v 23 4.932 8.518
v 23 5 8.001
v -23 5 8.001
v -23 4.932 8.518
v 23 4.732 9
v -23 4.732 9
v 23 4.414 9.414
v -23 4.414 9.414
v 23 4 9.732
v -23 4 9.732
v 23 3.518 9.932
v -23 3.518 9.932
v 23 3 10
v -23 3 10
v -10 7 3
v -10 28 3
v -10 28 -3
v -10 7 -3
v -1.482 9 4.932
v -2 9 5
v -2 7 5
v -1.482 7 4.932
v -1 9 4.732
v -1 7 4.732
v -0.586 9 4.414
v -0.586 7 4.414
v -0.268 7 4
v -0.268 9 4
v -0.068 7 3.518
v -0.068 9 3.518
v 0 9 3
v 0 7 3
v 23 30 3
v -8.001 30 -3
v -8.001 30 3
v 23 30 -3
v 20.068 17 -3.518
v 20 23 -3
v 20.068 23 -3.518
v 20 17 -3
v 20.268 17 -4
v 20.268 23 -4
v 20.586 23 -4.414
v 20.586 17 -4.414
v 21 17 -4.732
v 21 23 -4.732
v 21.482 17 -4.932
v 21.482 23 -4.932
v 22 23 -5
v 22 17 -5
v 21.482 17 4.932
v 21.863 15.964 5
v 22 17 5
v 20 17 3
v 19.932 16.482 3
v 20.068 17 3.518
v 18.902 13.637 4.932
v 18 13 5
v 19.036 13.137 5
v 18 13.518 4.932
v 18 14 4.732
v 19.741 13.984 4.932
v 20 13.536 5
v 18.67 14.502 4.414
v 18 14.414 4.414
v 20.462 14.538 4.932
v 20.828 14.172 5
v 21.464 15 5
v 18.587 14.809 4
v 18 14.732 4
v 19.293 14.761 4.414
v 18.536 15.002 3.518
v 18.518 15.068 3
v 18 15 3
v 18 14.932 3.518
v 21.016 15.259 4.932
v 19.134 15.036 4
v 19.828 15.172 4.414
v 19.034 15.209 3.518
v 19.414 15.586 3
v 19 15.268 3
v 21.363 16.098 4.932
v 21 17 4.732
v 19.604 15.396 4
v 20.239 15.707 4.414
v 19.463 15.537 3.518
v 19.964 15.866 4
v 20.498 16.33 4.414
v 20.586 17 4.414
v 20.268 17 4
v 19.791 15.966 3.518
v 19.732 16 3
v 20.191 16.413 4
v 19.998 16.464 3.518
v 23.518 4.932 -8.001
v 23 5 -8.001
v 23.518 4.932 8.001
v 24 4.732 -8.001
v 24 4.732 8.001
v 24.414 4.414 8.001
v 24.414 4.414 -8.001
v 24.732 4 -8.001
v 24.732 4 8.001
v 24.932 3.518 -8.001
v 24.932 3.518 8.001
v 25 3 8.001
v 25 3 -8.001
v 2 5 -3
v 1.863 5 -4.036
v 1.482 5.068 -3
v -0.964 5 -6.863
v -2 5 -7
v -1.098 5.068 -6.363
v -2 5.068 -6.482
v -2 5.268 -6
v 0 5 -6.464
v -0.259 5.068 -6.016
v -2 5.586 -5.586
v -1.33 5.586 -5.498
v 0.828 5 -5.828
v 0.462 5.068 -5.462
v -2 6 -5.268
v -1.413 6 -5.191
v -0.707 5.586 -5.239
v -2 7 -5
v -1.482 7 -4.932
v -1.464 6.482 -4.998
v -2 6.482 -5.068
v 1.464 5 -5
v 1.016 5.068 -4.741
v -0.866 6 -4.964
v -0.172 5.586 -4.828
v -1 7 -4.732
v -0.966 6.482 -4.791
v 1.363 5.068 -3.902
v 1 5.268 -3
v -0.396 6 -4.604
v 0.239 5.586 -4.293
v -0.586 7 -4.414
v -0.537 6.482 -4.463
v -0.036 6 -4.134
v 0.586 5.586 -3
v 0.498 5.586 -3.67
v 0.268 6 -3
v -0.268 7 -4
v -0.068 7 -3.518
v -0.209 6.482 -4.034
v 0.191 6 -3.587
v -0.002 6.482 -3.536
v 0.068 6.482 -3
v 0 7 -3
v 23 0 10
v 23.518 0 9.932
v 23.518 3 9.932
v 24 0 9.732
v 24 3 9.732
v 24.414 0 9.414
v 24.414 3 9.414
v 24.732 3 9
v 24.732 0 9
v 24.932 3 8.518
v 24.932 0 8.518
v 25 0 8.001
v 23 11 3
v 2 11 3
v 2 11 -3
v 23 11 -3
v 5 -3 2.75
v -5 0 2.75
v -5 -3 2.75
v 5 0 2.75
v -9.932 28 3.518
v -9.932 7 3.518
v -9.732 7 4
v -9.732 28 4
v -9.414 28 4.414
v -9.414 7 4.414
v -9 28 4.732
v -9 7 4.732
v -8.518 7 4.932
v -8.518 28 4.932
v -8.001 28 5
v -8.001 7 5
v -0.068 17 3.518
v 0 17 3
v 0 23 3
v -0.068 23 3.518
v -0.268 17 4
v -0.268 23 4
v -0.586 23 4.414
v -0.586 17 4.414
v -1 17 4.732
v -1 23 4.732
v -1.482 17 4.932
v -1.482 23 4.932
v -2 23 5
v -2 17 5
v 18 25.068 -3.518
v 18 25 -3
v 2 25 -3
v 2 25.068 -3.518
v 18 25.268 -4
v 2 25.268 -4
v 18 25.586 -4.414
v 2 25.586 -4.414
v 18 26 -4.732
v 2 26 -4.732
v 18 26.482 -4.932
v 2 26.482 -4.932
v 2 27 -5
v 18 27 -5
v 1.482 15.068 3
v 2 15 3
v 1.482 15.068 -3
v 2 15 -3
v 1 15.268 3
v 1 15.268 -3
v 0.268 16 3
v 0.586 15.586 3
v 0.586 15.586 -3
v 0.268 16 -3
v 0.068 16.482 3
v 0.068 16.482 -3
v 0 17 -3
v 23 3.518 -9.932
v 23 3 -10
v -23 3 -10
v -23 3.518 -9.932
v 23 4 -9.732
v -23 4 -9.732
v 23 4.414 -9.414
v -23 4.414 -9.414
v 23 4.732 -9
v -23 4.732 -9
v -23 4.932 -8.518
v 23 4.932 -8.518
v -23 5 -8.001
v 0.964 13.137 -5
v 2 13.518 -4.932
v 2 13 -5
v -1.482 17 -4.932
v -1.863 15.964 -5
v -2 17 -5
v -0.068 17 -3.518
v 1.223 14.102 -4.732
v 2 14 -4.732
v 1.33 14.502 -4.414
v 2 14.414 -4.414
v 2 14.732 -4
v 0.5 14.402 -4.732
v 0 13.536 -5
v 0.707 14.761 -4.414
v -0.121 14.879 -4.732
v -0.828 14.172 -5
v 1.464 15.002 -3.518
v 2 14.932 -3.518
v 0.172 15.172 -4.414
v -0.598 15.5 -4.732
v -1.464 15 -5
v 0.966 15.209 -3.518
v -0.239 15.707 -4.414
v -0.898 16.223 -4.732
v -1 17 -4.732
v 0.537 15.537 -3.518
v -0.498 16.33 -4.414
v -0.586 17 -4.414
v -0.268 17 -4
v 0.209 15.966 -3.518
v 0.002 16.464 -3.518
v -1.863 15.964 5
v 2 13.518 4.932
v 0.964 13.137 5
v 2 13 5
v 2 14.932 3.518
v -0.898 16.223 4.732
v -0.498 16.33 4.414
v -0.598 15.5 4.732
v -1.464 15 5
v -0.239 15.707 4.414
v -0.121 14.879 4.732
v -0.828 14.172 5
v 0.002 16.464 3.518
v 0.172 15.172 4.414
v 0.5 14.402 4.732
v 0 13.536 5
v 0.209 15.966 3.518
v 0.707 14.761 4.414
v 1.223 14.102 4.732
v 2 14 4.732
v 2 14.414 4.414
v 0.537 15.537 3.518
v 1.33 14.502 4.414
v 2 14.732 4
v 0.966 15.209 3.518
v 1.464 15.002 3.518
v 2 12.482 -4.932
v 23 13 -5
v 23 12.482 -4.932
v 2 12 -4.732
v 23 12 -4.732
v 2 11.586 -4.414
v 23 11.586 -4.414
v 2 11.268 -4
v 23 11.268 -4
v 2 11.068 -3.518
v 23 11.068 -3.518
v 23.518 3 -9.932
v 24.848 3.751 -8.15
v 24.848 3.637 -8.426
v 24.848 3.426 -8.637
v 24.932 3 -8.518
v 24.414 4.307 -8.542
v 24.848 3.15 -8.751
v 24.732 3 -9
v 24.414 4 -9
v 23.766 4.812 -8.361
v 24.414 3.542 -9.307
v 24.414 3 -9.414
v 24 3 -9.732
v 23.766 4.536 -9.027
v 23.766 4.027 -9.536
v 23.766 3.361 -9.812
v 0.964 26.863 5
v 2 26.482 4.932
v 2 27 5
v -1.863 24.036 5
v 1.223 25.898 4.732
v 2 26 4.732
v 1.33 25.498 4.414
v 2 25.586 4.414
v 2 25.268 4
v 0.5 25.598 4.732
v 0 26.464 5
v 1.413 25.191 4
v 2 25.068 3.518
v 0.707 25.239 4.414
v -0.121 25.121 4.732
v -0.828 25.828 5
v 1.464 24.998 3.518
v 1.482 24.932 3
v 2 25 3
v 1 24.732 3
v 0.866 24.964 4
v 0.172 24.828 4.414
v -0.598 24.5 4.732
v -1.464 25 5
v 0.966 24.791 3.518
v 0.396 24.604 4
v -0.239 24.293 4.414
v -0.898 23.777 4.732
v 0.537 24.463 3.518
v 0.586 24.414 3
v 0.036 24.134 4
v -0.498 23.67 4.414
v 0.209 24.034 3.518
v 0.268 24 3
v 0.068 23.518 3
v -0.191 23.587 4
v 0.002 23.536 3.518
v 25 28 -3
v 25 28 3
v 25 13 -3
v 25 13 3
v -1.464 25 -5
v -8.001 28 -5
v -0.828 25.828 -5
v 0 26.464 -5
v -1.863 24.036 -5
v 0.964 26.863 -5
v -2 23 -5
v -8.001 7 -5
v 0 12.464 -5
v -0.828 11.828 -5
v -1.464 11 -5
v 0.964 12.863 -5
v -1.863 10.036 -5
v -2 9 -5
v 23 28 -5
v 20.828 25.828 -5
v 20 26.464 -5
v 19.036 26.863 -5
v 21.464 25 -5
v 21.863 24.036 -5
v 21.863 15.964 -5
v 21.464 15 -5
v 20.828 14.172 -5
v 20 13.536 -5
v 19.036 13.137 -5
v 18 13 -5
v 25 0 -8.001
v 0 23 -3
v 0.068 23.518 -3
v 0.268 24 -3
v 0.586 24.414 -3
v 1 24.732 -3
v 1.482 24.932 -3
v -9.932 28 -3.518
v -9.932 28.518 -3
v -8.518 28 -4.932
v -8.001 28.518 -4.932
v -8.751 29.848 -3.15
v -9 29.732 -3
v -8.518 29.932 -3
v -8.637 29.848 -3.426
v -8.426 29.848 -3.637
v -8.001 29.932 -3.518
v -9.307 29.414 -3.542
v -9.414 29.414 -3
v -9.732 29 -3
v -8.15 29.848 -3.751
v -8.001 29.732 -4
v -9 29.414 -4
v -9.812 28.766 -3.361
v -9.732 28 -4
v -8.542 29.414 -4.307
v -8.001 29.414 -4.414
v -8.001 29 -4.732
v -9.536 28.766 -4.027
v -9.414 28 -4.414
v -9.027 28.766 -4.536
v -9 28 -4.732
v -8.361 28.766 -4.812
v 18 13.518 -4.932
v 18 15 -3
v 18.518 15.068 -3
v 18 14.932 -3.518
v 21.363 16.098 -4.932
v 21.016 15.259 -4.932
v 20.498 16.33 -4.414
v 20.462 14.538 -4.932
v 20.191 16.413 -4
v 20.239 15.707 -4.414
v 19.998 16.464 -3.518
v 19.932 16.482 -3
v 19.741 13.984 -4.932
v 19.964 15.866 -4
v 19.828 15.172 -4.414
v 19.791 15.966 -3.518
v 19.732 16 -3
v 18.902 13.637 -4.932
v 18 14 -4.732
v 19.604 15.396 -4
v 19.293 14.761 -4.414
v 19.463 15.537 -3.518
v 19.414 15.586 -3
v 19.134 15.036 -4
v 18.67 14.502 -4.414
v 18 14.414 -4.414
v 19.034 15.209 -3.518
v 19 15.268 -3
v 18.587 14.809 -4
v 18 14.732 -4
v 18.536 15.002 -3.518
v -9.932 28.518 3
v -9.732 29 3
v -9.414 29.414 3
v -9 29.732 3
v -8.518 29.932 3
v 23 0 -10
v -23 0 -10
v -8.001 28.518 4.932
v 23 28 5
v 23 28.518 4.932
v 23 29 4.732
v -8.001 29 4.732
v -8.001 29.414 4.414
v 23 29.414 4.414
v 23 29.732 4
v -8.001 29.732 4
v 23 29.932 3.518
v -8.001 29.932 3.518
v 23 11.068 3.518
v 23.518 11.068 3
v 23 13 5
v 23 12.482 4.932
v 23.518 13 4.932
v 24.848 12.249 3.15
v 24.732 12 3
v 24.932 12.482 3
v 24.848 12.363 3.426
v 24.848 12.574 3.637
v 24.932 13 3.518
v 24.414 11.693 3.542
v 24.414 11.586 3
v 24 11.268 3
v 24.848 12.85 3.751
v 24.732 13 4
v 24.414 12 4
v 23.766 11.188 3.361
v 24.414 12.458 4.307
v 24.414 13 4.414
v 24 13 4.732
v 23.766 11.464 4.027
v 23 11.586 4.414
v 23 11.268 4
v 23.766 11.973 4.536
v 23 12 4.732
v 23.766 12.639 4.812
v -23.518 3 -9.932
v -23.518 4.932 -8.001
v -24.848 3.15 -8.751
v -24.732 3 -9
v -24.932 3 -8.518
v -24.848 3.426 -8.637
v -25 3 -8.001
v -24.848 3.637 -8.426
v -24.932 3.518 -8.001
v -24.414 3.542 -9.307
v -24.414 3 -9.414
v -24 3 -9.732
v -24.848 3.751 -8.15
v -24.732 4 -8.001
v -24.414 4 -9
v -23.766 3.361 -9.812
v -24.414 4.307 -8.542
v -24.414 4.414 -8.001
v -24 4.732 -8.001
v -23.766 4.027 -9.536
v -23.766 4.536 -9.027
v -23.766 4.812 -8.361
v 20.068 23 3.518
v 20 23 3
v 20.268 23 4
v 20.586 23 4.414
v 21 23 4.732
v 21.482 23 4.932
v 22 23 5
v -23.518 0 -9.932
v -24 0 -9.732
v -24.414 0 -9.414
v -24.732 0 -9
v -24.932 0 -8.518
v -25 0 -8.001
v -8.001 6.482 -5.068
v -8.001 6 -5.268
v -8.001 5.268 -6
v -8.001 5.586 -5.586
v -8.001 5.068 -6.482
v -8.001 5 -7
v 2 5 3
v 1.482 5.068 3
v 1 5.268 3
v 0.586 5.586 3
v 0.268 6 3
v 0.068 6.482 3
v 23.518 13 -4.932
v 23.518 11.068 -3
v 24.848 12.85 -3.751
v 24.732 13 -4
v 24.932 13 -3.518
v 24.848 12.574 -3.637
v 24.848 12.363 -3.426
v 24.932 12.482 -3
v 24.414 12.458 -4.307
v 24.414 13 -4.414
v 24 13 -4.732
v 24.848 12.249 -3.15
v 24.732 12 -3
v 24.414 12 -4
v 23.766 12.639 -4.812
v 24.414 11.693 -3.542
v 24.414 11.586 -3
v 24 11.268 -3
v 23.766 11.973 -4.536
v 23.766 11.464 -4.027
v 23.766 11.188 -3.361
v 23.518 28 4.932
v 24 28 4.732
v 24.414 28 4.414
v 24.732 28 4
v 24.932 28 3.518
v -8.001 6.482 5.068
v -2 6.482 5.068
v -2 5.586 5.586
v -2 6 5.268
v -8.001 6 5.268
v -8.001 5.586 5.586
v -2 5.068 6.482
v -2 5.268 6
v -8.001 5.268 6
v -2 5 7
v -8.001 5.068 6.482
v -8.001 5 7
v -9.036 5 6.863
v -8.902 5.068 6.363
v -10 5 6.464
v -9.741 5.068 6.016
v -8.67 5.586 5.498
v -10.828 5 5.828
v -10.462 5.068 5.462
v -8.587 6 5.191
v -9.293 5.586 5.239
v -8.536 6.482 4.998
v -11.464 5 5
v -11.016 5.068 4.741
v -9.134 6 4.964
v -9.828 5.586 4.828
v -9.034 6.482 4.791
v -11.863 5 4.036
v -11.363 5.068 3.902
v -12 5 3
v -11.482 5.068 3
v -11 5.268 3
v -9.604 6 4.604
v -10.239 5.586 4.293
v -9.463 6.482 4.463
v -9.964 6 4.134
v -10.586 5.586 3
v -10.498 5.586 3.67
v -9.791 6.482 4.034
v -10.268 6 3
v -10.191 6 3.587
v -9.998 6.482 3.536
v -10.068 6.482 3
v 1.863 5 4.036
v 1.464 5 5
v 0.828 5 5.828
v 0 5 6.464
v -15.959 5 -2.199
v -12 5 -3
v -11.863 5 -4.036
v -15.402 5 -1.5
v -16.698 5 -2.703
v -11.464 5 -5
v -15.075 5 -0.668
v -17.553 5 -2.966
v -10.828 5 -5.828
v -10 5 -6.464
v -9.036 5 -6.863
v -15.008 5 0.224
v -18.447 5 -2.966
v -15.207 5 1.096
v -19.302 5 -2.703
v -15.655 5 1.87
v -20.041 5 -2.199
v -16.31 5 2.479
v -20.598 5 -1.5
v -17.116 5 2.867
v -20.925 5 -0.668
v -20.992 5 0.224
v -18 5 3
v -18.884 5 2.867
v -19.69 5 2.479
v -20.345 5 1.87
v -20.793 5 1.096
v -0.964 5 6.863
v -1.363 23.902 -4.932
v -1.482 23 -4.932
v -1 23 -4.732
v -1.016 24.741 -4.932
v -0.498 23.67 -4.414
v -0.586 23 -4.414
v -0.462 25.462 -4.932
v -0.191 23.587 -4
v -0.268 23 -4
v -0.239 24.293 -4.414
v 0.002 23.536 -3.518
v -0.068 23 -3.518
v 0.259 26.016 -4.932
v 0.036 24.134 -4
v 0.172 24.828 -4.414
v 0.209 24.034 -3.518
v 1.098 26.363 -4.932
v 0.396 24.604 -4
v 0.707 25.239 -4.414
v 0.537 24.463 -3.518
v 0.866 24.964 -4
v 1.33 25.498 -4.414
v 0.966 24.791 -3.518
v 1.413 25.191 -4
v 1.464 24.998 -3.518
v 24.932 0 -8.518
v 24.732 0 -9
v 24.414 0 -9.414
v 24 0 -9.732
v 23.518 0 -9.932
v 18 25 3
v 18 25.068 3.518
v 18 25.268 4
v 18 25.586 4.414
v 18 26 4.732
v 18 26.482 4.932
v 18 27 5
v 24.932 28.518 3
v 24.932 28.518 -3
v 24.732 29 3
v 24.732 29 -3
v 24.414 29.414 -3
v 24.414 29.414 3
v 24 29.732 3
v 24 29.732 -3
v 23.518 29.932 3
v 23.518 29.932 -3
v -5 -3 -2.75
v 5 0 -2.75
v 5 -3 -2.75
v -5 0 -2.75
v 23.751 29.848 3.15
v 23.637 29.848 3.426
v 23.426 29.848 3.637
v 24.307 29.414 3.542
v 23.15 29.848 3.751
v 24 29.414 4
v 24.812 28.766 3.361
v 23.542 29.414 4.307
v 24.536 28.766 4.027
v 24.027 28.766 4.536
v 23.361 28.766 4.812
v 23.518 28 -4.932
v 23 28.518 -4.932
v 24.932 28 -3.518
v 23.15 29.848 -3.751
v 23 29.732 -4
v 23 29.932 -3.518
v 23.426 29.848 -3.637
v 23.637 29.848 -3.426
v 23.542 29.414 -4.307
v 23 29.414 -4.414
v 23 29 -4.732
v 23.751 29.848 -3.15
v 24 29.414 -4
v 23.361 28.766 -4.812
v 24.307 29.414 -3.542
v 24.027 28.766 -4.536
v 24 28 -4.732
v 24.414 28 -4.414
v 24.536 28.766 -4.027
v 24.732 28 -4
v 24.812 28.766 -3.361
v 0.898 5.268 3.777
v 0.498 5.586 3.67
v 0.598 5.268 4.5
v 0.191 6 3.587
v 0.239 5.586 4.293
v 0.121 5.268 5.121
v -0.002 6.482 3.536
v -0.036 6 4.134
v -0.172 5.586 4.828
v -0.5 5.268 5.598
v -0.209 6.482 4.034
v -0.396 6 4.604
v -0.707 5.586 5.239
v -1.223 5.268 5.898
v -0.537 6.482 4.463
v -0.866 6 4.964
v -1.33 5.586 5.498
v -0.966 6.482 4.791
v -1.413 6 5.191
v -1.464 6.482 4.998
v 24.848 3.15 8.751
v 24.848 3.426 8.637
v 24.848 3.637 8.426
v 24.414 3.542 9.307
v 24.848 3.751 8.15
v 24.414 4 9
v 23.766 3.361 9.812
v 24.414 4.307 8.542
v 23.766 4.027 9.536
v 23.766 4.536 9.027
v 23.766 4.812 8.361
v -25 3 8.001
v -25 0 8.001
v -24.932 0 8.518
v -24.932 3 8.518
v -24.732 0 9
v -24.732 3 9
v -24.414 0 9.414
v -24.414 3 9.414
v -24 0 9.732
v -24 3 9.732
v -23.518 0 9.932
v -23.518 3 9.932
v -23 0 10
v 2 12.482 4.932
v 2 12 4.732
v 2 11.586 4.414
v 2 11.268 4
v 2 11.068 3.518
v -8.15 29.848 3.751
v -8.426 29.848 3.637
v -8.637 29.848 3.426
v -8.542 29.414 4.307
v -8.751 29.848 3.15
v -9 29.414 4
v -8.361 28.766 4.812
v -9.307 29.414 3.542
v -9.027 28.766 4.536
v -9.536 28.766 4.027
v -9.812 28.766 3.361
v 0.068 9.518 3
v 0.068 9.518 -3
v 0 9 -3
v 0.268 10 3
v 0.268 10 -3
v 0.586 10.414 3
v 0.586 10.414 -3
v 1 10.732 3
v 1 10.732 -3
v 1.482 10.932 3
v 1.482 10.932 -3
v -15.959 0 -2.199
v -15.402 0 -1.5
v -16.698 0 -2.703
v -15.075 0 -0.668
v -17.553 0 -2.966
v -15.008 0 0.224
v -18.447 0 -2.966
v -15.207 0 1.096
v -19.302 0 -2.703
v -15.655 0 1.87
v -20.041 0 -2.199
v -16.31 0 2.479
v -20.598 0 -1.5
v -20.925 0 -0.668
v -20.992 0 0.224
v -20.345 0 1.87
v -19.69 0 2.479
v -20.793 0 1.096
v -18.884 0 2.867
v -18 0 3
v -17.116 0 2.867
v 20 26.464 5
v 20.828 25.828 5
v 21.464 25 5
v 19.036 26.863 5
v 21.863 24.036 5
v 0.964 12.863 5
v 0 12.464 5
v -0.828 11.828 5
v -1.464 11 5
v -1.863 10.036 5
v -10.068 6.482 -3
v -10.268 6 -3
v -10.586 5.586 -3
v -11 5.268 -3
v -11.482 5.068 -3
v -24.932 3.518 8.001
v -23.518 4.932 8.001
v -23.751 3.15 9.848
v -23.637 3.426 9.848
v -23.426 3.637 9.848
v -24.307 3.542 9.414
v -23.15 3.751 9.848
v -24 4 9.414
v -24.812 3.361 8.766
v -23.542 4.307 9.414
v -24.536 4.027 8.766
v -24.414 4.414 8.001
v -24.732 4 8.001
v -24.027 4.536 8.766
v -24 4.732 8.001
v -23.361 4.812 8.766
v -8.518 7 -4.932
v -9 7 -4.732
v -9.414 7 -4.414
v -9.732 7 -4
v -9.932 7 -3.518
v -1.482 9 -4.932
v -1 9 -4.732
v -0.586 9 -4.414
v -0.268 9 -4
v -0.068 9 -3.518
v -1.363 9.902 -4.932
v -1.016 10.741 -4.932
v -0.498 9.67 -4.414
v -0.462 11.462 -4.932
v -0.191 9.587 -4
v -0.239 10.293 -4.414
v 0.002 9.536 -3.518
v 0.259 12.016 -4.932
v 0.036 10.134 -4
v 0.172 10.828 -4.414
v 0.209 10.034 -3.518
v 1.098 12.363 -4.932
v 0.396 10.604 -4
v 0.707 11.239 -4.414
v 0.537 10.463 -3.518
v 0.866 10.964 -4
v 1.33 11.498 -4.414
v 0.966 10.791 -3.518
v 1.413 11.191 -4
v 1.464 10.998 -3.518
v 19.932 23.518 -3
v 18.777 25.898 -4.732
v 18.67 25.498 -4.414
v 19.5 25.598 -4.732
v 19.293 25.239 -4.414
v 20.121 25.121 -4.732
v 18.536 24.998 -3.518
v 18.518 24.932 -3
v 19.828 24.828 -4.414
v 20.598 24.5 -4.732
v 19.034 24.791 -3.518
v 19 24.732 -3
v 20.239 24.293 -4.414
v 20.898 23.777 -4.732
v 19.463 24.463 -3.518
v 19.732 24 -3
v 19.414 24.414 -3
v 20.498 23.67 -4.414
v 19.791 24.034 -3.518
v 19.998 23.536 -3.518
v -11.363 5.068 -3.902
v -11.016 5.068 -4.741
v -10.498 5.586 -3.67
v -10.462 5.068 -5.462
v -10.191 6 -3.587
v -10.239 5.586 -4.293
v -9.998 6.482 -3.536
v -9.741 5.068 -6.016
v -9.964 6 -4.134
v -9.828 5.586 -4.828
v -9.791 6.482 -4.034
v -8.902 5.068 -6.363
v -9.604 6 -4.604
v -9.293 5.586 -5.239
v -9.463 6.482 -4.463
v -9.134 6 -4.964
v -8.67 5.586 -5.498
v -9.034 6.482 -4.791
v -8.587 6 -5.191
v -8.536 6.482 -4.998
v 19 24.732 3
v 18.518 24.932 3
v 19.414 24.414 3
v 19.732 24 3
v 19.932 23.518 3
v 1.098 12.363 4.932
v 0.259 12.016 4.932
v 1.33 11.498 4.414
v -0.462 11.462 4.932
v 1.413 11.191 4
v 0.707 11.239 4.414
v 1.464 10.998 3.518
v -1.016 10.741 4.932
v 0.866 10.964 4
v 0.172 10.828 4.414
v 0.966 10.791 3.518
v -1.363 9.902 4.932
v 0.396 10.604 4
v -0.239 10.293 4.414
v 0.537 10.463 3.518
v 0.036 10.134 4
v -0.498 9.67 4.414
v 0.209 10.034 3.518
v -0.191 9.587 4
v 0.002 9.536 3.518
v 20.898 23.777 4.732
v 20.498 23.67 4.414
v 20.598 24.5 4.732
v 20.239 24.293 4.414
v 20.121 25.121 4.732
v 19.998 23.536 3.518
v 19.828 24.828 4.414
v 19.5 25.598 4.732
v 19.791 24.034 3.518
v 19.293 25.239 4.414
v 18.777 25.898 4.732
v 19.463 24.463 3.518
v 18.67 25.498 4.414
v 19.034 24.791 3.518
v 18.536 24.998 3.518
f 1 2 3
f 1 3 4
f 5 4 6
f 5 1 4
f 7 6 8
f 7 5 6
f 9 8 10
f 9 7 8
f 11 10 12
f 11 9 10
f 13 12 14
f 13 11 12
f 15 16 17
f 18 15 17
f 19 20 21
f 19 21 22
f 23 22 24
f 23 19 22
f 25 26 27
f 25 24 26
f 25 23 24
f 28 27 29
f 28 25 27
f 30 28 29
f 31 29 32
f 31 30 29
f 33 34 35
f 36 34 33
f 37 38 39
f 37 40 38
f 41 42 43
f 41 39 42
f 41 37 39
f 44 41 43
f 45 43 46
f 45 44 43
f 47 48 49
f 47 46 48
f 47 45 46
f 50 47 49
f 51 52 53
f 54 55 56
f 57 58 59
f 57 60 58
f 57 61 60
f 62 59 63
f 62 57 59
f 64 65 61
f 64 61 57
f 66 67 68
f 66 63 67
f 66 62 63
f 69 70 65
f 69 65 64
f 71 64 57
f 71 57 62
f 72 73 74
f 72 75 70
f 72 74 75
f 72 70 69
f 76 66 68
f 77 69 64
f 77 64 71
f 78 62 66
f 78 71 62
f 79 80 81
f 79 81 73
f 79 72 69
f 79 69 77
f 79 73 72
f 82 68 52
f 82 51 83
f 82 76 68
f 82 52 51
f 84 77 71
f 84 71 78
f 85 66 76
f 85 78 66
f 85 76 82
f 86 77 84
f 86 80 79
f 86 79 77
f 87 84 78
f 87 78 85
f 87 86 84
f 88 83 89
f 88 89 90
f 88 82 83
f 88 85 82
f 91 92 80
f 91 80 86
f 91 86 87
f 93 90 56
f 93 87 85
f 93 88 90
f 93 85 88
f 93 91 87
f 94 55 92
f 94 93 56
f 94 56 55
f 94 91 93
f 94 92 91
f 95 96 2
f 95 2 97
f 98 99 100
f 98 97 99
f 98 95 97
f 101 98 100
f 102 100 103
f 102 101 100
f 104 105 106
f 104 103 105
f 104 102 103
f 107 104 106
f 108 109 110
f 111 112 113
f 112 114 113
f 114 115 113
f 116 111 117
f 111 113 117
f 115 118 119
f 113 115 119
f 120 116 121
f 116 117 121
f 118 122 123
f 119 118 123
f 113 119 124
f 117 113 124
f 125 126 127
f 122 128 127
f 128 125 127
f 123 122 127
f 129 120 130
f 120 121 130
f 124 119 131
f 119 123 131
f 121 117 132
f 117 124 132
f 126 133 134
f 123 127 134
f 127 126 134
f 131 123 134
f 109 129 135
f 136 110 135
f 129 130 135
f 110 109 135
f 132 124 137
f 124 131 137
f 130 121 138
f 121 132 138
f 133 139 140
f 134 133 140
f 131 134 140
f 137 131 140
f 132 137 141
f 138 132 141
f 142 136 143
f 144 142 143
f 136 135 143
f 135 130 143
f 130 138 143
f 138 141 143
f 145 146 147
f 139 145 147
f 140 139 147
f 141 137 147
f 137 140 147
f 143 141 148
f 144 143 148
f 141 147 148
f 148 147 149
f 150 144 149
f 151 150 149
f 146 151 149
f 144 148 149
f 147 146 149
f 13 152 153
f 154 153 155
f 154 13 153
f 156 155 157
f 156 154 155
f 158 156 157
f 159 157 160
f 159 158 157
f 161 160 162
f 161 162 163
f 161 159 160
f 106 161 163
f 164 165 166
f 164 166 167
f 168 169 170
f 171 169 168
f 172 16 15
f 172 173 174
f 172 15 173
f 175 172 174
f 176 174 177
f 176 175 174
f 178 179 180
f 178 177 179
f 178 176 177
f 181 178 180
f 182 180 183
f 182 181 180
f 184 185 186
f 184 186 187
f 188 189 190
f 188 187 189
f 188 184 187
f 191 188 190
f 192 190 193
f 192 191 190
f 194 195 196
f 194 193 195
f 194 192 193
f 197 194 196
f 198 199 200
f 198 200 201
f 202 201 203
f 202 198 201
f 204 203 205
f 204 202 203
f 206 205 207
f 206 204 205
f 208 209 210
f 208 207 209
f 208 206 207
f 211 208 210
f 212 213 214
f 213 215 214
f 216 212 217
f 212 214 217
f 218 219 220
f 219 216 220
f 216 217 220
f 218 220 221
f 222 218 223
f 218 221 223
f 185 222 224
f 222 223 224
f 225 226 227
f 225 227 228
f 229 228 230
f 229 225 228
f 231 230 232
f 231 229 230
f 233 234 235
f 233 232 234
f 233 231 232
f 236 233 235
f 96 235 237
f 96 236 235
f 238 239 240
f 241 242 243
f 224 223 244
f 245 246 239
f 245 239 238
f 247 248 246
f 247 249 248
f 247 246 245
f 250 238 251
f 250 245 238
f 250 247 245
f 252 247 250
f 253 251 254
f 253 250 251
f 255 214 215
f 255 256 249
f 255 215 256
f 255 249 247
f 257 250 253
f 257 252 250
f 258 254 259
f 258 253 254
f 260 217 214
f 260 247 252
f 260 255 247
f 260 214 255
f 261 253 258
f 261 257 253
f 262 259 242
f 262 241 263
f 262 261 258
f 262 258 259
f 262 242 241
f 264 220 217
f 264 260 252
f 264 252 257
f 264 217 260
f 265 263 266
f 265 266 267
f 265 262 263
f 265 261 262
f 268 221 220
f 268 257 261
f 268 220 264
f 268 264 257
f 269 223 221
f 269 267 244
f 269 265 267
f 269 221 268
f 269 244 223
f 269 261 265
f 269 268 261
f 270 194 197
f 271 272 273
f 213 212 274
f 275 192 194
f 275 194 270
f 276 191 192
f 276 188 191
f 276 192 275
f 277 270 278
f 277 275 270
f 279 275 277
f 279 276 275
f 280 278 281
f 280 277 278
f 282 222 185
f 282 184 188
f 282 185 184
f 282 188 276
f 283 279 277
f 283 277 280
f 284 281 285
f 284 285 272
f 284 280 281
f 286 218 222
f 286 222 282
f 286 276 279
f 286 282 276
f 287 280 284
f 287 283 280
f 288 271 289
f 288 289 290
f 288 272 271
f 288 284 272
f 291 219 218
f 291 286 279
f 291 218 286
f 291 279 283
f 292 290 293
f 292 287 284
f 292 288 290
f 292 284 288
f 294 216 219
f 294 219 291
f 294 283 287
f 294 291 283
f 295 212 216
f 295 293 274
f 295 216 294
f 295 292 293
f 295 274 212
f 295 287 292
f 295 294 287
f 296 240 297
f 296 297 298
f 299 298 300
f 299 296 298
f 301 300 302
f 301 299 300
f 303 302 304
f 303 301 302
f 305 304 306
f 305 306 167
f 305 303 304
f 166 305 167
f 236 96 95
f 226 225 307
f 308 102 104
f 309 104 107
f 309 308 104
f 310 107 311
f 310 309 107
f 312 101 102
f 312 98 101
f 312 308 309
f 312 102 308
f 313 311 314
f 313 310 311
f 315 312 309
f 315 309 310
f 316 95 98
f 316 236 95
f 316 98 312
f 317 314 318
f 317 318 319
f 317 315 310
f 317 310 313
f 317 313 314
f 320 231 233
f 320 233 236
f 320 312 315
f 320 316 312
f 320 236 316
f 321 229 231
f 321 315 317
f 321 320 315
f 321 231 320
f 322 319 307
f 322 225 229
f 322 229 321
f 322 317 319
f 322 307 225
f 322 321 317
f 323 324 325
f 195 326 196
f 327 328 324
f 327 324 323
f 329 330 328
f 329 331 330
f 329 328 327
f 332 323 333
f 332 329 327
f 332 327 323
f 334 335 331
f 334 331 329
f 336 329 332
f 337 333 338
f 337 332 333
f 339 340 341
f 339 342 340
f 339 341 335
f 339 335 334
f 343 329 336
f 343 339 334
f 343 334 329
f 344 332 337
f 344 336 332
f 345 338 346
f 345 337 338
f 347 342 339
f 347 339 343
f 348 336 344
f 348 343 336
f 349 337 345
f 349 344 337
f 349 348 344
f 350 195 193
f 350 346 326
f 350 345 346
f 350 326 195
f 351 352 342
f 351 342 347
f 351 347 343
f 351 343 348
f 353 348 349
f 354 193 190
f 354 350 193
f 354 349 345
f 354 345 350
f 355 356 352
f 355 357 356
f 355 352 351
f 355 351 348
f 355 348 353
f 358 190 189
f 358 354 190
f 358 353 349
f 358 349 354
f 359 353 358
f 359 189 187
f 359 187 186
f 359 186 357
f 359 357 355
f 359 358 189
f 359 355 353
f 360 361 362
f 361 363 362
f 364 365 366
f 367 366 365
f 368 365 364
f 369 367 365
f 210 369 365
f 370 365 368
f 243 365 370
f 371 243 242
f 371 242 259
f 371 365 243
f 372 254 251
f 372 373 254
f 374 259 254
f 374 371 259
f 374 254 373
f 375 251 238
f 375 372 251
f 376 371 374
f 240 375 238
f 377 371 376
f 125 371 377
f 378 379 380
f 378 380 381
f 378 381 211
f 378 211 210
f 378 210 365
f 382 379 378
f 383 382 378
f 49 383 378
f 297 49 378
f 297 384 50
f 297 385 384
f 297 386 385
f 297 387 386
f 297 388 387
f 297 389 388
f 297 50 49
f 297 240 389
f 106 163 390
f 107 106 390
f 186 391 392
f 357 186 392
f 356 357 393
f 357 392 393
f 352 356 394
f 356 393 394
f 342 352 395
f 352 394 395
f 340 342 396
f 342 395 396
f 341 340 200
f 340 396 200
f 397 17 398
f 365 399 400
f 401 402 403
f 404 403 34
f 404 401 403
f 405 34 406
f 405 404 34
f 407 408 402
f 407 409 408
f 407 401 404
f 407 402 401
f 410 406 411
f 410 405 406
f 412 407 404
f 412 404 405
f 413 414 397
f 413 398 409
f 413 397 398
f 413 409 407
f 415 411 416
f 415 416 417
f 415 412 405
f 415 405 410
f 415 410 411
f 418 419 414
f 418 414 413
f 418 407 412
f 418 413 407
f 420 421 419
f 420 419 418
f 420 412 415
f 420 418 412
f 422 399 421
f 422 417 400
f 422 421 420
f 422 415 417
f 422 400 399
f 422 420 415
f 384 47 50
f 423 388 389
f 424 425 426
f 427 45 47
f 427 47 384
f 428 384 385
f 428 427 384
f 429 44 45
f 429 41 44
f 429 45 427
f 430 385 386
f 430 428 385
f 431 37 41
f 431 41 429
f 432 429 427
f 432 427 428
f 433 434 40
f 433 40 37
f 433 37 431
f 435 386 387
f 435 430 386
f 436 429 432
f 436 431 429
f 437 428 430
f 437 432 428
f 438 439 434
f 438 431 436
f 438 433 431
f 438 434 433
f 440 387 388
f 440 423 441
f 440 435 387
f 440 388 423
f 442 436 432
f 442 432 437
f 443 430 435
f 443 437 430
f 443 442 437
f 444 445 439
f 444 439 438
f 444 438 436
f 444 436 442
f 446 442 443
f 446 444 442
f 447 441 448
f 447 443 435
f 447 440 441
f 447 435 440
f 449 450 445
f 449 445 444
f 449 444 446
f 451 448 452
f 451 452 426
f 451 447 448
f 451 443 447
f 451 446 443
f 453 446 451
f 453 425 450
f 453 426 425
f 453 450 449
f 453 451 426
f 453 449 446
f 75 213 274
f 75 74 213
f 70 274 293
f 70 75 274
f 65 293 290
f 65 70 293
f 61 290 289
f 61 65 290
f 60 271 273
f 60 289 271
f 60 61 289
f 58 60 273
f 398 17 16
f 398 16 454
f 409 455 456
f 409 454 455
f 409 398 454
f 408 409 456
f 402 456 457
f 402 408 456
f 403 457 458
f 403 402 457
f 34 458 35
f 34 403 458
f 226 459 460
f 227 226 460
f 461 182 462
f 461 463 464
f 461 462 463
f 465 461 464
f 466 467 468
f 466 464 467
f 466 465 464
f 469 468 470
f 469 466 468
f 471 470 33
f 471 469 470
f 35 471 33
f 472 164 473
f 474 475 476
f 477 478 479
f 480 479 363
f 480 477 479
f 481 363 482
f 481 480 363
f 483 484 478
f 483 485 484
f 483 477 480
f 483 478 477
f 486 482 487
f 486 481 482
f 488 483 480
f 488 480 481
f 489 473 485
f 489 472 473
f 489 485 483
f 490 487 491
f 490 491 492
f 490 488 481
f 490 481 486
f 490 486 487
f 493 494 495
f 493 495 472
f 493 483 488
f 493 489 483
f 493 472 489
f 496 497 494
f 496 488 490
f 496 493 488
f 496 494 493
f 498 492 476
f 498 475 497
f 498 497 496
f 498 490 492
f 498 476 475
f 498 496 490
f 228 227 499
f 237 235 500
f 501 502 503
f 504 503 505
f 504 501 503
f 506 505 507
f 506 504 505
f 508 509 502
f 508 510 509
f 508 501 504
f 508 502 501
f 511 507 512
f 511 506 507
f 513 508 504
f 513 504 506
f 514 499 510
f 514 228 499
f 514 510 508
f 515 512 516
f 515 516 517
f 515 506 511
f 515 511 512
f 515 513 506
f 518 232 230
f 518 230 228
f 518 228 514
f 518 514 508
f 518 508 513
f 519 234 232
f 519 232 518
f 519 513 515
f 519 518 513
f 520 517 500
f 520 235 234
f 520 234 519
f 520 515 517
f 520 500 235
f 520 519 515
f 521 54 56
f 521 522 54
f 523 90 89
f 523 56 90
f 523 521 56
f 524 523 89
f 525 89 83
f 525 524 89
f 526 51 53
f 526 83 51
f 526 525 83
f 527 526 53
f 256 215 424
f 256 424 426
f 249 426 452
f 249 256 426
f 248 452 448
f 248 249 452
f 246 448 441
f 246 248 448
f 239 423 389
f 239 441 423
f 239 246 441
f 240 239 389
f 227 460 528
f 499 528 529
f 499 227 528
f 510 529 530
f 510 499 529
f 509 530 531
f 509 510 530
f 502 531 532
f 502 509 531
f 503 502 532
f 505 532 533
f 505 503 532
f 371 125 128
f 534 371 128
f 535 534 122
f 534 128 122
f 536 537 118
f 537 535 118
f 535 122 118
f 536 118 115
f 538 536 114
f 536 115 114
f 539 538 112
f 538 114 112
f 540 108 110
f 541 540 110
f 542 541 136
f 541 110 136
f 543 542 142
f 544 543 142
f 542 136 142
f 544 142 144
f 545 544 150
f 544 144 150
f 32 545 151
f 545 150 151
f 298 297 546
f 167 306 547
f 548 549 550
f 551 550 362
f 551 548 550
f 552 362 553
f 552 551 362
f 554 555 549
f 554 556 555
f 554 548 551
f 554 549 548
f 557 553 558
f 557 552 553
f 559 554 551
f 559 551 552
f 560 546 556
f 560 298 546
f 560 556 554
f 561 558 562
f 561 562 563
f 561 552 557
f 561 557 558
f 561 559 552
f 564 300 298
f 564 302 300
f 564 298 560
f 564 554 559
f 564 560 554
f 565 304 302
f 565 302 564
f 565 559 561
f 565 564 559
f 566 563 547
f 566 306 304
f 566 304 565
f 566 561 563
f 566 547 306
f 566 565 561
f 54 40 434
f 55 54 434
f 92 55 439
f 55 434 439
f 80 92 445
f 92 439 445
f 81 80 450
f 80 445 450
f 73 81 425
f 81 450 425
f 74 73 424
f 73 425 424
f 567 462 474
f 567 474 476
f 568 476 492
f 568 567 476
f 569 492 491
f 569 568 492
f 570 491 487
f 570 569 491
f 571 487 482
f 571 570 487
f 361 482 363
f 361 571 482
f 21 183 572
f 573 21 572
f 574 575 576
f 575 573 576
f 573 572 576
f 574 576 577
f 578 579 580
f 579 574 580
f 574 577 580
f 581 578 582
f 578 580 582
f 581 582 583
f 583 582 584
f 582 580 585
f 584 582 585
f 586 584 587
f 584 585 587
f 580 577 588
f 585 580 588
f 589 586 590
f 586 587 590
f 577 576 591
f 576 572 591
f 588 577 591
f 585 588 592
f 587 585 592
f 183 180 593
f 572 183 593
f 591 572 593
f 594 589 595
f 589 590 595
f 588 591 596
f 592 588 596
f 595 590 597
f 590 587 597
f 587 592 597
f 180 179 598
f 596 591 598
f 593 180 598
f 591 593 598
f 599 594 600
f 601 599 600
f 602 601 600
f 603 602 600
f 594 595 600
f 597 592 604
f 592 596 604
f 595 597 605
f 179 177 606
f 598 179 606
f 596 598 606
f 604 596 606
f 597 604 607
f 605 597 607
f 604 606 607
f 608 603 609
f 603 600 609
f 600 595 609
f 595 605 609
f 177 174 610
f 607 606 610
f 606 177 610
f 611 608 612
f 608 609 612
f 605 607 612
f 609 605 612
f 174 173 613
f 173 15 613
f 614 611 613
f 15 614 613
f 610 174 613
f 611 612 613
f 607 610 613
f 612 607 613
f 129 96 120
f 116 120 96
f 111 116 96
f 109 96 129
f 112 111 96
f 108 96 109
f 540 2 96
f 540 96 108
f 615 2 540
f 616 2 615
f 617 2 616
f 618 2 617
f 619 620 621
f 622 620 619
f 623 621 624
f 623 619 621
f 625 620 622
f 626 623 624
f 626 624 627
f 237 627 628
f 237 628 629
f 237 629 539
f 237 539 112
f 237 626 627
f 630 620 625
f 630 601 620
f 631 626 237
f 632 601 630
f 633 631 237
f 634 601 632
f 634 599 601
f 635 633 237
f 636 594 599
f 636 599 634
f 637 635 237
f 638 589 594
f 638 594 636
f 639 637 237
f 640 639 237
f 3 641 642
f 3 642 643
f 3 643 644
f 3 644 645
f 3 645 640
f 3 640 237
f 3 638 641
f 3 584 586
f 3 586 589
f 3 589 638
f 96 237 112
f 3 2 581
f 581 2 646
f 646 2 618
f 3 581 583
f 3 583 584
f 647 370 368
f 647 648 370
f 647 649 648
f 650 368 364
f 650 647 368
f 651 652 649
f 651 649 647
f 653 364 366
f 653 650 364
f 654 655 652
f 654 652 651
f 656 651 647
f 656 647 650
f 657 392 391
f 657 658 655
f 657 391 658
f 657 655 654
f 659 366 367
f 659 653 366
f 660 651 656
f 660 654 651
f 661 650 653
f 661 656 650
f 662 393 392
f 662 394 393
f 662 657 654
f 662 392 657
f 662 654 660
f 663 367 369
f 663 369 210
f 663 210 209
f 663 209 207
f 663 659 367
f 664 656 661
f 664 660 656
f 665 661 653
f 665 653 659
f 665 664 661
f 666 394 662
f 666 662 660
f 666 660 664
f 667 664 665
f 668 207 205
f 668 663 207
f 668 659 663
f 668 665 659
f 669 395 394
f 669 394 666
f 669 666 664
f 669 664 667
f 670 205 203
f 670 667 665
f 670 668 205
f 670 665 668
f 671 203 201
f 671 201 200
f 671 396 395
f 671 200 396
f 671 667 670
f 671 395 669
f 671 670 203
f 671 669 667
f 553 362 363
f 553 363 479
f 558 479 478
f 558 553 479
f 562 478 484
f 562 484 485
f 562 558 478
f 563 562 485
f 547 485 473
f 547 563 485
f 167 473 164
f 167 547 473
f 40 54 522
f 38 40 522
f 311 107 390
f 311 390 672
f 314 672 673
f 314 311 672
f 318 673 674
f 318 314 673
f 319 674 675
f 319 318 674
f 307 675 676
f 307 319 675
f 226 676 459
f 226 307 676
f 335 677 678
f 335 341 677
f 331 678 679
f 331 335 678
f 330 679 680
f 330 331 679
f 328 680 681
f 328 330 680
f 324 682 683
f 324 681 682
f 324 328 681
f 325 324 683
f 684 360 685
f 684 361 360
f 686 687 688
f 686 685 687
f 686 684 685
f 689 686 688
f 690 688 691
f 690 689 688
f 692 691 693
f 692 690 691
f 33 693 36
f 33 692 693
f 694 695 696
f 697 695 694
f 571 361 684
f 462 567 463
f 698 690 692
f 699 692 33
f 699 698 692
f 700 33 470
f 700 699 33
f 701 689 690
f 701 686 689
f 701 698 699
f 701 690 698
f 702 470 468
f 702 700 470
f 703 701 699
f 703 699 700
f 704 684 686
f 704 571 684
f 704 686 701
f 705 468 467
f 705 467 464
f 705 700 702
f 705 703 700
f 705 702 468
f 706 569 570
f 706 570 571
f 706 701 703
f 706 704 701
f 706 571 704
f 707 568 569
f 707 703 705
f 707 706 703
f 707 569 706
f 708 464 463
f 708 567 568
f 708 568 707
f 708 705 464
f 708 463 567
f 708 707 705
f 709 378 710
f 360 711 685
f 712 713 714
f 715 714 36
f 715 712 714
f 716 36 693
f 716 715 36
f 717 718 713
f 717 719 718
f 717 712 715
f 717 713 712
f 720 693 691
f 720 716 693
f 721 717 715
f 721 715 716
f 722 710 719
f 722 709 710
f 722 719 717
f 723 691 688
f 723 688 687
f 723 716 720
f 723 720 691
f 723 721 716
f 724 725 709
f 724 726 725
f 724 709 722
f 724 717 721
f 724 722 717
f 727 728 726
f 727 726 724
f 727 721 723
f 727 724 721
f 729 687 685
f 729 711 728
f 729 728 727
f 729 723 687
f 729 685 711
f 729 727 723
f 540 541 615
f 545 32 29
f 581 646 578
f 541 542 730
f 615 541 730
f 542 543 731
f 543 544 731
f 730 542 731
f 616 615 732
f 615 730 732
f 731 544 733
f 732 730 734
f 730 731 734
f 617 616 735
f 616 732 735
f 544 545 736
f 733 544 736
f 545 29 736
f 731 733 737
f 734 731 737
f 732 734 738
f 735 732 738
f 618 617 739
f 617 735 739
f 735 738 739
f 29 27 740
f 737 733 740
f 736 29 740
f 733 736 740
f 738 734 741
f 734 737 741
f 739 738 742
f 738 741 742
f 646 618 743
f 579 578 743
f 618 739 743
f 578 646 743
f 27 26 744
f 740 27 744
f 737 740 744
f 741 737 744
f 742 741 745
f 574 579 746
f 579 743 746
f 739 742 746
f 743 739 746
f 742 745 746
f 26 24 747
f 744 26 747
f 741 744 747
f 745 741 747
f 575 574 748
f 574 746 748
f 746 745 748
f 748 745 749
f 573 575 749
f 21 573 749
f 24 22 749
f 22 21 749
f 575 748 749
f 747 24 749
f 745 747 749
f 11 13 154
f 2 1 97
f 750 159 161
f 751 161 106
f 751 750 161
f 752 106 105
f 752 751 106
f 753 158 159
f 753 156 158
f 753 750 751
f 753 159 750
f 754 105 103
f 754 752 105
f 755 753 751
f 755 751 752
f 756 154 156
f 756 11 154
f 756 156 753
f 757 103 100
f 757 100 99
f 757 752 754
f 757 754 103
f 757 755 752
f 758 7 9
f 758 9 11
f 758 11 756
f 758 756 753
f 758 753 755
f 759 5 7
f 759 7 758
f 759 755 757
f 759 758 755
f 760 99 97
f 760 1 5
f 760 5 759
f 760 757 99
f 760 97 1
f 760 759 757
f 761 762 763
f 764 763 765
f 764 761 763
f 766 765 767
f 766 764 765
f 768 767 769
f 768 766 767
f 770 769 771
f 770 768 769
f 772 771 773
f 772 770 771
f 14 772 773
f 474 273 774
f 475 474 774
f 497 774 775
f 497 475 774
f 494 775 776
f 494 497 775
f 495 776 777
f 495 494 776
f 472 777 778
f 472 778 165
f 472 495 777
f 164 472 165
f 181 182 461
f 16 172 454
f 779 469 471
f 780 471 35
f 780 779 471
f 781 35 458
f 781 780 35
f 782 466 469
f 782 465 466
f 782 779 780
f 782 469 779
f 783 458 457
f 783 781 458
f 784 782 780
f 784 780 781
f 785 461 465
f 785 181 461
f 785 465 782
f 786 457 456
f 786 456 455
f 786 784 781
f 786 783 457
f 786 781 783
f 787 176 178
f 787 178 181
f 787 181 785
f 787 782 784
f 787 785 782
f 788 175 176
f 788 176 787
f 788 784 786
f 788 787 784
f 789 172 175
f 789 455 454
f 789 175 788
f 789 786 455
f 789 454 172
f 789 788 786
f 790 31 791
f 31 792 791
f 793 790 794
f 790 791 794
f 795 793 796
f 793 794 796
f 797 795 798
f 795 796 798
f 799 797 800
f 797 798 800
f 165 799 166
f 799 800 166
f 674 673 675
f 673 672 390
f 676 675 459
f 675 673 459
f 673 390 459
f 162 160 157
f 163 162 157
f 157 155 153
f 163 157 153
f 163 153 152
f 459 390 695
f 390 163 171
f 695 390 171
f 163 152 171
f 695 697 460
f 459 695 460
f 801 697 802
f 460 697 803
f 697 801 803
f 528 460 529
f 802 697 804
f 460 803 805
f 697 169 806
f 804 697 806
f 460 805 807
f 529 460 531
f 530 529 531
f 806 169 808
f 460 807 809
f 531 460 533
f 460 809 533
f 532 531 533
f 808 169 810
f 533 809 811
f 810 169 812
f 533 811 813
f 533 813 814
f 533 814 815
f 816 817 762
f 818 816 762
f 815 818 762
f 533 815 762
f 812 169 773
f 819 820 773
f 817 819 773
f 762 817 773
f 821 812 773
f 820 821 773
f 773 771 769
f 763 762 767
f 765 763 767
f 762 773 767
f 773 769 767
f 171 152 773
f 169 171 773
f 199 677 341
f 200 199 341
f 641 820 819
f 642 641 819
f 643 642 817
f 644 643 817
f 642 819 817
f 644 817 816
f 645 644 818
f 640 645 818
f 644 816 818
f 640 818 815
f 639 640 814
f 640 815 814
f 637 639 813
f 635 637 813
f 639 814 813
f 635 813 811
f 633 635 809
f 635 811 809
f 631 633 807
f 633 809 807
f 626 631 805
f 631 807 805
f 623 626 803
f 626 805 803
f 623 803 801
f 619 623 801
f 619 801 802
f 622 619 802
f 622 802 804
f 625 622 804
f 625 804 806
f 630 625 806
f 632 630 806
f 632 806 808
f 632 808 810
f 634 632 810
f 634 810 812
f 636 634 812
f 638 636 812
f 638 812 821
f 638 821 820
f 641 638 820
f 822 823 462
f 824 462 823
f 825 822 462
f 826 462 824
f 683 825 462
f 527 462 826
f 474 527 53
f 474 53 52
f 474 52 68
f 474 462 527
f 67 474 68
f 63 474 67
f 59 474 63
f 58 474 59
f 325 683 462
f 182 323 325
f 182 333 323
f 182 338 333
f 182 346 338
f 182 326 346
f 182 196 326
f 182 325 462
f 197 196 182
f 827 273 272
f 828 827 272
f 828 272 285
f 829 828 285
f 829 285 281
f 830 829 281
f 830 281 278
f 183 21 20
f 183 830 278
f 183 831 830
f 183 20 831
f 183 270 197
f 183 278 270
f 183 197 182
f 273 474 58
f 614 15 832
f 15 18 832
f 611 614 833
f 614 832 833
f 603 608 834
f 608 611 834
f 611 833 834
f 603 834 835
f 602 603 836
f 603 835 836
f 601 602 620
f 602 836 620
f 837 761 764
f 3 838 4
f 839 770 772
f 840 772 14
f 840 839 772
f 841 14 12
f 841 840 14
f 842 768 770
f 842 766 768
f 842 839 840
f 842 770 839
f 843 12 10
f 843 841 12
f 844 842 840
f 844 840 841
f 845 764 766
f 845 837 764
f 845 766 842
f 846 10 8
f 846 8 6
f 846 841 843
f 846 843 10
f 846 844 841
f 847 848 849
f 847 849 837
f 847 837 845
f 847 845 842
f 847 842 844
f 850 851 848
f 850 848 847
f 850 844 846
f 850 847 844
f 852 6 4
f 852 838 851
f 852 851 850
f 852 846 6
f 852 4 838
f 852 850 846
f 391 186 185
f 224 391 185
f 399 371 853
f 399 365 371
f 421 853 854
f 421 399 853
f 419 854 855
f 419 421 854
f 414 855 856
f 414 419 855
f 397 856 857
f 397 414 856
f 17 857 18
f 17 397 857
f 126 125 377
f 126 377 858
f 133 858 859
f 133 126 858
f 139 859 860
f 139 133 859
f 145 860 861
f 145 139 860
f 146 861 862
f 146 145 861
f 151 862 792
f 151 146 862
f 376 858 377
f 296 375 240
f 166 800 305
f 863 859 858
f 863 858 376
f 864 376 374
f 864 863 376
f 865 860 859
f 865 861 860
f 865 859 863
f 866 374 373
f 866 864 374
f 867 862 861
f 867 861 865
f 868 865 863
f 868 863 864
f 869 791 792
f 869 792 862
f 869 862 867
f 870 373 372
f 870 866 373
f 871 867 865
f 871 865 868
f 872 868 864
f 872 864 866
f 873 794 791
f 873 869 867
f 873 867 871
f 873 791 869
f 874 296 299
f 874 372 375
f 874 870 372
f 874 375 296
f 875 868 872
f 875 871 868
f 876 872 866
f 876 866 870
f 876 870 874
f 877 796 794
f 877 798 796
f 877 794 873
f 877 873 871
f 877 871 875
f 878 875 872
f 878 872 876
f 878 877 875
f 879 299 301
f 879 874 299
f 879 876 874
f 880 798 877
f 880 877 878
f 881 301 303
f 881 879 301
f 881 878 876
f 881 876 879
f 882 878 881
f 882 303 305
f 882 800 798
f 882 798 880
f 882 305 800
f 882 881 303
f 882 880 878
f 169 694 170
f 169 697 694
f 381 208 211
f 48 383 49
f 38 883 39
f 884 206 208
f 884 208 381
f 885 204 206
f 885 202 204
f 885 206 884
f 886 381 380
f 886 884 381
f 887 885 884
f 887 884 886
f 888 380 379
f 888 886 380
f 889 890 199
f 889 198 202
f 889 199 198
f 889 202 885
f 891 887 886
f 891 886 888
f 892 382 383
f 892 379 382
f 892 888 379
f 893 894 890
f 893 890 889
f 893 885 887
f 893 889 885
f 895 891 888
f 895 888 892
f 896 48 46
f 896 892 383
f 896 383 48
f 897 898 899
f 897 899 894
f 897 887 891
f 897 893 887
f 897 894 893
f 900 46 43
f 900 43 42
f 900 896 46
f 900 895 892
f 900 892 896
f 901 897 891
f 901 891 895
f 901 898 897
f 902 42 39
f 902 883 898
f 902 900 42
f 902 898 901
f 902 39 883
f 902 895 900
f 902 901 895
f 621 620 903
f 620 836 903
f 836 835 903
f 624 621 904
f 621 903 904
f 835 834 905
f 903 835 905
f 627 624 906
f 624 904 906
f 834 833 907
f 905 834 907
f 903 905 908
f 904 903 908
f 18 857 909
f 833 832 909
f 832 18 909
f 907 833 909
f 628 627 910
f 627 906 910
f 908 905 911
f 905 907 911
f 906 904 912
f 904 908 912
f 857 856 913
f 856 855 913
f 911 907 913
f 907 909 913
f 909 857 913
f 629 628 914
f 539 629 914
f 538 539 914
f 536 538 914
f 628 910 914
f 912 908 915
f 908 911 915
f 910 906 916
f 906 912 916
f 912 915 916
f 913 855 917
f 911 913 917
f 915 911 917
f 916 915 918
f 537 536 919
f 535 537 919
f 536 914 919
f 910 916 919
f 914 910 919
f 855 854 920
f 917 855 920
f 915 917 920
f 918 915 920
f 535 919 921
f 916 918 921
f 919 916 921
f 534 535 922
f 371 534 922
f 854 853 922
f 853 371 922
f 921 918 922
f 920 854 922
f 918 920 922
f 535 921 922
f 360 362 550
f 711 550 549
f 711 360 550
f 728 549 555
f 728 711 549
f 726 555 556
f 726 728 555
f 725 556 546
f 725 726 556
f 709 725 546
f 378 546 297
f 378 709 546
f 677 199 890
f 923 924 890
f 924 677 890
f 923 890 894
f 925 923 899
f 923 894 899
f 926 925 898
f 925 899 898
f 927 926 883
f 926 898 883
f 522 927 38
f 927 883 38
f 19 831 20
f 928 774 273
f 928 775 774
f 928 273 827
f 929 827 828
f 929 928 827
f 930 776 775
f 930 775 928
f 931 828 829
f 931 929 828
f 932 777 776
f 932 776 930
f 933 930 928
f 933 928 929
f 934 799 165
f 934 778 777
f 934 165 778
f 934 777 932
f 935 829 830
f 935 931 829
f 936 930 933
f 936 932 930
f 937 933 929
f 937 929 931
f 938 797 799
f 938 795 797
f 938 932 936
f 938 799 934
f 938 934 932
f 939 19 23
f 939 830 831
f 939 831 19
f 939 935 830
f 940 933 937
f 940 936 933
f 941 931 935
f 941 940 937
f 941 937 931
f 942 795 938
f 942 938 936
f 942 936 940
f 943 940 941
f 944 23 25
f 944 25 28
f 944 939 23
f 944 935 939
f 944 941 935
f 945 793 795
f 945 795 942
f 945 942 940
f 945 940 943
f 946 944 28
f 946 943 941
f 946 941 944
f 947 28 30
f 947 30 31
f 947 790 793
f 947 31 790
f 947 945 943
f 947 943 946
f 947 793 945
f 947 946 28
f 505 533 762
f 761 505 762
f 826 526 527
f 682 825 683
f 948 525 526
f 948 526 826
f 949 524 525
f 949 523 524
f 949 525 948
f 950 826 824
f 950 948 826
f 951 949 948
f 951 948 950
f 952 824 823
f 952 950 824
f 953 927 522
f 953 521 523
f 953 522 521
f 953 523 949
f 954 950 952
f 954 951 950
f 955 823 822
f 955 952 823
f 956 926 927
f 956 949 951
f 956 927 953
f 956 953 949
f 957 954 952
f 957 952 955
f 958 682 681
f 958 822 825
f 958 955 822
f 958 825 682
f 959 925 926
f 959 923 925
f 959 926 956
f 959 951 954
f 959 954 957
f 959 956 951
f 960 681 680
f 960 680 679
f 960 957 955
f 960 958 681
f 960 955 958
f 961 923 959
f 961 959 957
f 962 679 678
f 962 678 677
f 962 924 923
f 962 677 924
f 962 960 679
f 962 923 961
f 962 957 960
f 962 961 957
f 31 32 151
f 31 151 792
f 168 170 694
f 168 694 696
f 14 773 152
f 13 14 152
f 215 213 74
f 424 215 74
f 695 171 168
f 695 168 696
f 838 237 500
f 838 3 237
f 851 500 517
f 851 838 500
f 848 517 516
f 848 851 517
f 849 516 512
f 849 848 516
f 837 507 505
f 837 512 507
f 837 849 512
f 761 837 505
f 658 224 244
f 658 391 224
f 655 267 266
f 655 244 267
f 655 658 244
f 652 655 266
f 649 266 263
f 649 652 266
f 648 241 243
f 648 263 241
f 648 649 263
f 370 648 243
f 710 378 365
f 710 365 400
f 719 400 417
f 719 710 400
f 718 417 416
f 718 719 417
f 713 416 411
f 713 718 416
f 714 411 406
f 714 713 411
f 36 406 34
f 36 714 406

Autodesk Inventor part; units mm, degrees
ref_plane "YZ Plane" through (0, 0, 0) normal (1, 0, 0) x (0, 1, 0)
ref_plane "XZ Plane" through (0, 0, 0) normal (0, 1, 0) x (-1, 0, 0)
ref_plane "XY Plane" through (0, 0, 0) normal (0, 0, 1) x (1, 0, 0)
sketch "スケッチ1" plane through (0, 0, 0) normal (0, 1, 0) x (-1, 0, 0)
  line L0 (25, 10) -> (-25, 10)
  line L1 (-25, 10) -> (-25, -10)
  line L2 (-25, -10) -> (25, -10)
  line L3 (25, -10) -> (25, 10)
  line L4 (25, 10) -> (-25, -10) construction
  line L5 (-25, 10) -> (25, -10) construction
  point P0 (0, 0)
  dimension "d0" = 20
  dimension "d1" = 50
extrude "押し出し1" add sketch "スケッチ1" along normal blind 5
sketch "スケッチ4" plane through (0, 5, 0) normal (0, 1, 0) x (1, 0, 0)
  line L0 (-25, -10) -> (25, -10) projected
  line L1 (-25, 10) -> (-25, -10) projected
  line L2 (25, -10) -> (25, 10) projected
  point P0 (0, 0)
  point P1 (-18, 0)
  dimension "d17" = 10
  dimension "d18" = 7
hole "穴2" at (-18, 5, 0) direction (0, -1, 0) diameter 6 end through all
sketch "スケッチ5" plane through (0, 5, 0) normal (0, 1, 0) x (1, 0, 0)
  line L0 (-10, 5) -> (25, 5)
  line L1 (25, 5) -> (25, -5)
  line L2 (25, -5) -> (-10, -5)
  line L3 (-10, -5) -> (-10, 5)
  line L4 (-25, 10) -> (-25, -10) projected
  point P0 (0, 0)
  dimension "d30" = 10
  dimension "d31" = 35
  dimension "d32" = 5
  dimension "d45" = 15
extrude "押し出し3" add sketch "スケッチ5" along normal blind 25
sketch "スケッチ6" plane through (0, 0, 0) normal (0, -1, 0) x (1, 0, 0)
  line L0 (-5, 2.75) -> (5, 2.75)
  line L1 (5, 2.75) -> (5, -2.75)
  line L2 (5, -2.75) -> (-5, -2.75)
  line L3 (-5, -2.75) -> (-5, 2.75)
  line L4 (-5, 2.75) -> (5, -2.75) construction
  line L5 (5, 2.75) -> (-5, -2.75) construction
  point P0 (0, 0)
  dimension "d35" = 10
  dimension "d36" = 5.5
extrude "押し出し4" add sketch "スケッチ6" along normal blind 3
sketch "スケッチ8" plane through (-10, 30, 5) normal (0, 0, 1) x (1, 0, 0)
  line L0 (10, -19) -> (35, -19)
  line L1 (35, -19) -> (35, -25)
  line L2 (35, -25) -> (10, -25)
  line L3 (10, -25) -> (10, -19)
  line L4 (30, -5) -> (30, -20) projected
  line L5 (35, -25) -> (35, 0) projected
  line L6 (-15, -25) -> (35, -25) projected
  point P0 (10, -30)
  dimension "d47" = 0
  dimension "d48" = 0
  dimension "d49" = 6
  dimension "d58" = 25
extrude "押し出し6" cut sketch "スケッチ8" against normal through all
sketch "スケッチ9" plane through (-10, 30, 5) normal (0, 0, 1) x (1, 0, 0)
  line L0 (30, -5) -> (10, -5)
  line L1 (10, -5) -> (10, -15)
  line L2 (10, -15) -> (30, -15)
  line L3 (30, -15) -> (30, -5)
  line L4 (0, 0) -> (35, 0) projected
  line L5 (35, -19) -> (35, 0) projected
  point P0 (10, -30)
  dimension "d52" = 5
  dimension "d53" = 5
  dimension "d54" = 20
  dimension "d55" = 10
extrude "押し出し7" cut sketch "スケッチ9" against normal through all
fillet "フィレット2" radius 2 38 edges at (-10, 17.5, 5) (10, 15, 5) (10, 15, -5) (12.5, 11, -5) (-10, 17.5, -5) (0, 11, 0) (0, 8, -5) (12.5, 11, 5) (0, 8, 5) (25, 20.5, 5) (25, 20.5, -5) (25, 11, 0) (20, 15, 0) (20, 20, 5) (20, 20, -5) (0, 15, 0) (-10, 30, 0) (0, 25, 0) (0, 20, -5) (7.5, 30, 5) (7.5, 30, -5) (10, 25, -5) (10, 25, 5) (0, 20, 5) (25, 30, 0) (20, 25, 0) (0, 5, 0) (-5, 5, 5) (-10, 5, 0) (-5, 5, -5) (0, 5, -10) (-25, 5, 0) (0, 5, 10) (-25, 2.5, -10) (-25, 2.5, 10) (25, 2.5, -10) (25, 5, 0) (25, 2.5, 10)
properties part number "cable_holder"
